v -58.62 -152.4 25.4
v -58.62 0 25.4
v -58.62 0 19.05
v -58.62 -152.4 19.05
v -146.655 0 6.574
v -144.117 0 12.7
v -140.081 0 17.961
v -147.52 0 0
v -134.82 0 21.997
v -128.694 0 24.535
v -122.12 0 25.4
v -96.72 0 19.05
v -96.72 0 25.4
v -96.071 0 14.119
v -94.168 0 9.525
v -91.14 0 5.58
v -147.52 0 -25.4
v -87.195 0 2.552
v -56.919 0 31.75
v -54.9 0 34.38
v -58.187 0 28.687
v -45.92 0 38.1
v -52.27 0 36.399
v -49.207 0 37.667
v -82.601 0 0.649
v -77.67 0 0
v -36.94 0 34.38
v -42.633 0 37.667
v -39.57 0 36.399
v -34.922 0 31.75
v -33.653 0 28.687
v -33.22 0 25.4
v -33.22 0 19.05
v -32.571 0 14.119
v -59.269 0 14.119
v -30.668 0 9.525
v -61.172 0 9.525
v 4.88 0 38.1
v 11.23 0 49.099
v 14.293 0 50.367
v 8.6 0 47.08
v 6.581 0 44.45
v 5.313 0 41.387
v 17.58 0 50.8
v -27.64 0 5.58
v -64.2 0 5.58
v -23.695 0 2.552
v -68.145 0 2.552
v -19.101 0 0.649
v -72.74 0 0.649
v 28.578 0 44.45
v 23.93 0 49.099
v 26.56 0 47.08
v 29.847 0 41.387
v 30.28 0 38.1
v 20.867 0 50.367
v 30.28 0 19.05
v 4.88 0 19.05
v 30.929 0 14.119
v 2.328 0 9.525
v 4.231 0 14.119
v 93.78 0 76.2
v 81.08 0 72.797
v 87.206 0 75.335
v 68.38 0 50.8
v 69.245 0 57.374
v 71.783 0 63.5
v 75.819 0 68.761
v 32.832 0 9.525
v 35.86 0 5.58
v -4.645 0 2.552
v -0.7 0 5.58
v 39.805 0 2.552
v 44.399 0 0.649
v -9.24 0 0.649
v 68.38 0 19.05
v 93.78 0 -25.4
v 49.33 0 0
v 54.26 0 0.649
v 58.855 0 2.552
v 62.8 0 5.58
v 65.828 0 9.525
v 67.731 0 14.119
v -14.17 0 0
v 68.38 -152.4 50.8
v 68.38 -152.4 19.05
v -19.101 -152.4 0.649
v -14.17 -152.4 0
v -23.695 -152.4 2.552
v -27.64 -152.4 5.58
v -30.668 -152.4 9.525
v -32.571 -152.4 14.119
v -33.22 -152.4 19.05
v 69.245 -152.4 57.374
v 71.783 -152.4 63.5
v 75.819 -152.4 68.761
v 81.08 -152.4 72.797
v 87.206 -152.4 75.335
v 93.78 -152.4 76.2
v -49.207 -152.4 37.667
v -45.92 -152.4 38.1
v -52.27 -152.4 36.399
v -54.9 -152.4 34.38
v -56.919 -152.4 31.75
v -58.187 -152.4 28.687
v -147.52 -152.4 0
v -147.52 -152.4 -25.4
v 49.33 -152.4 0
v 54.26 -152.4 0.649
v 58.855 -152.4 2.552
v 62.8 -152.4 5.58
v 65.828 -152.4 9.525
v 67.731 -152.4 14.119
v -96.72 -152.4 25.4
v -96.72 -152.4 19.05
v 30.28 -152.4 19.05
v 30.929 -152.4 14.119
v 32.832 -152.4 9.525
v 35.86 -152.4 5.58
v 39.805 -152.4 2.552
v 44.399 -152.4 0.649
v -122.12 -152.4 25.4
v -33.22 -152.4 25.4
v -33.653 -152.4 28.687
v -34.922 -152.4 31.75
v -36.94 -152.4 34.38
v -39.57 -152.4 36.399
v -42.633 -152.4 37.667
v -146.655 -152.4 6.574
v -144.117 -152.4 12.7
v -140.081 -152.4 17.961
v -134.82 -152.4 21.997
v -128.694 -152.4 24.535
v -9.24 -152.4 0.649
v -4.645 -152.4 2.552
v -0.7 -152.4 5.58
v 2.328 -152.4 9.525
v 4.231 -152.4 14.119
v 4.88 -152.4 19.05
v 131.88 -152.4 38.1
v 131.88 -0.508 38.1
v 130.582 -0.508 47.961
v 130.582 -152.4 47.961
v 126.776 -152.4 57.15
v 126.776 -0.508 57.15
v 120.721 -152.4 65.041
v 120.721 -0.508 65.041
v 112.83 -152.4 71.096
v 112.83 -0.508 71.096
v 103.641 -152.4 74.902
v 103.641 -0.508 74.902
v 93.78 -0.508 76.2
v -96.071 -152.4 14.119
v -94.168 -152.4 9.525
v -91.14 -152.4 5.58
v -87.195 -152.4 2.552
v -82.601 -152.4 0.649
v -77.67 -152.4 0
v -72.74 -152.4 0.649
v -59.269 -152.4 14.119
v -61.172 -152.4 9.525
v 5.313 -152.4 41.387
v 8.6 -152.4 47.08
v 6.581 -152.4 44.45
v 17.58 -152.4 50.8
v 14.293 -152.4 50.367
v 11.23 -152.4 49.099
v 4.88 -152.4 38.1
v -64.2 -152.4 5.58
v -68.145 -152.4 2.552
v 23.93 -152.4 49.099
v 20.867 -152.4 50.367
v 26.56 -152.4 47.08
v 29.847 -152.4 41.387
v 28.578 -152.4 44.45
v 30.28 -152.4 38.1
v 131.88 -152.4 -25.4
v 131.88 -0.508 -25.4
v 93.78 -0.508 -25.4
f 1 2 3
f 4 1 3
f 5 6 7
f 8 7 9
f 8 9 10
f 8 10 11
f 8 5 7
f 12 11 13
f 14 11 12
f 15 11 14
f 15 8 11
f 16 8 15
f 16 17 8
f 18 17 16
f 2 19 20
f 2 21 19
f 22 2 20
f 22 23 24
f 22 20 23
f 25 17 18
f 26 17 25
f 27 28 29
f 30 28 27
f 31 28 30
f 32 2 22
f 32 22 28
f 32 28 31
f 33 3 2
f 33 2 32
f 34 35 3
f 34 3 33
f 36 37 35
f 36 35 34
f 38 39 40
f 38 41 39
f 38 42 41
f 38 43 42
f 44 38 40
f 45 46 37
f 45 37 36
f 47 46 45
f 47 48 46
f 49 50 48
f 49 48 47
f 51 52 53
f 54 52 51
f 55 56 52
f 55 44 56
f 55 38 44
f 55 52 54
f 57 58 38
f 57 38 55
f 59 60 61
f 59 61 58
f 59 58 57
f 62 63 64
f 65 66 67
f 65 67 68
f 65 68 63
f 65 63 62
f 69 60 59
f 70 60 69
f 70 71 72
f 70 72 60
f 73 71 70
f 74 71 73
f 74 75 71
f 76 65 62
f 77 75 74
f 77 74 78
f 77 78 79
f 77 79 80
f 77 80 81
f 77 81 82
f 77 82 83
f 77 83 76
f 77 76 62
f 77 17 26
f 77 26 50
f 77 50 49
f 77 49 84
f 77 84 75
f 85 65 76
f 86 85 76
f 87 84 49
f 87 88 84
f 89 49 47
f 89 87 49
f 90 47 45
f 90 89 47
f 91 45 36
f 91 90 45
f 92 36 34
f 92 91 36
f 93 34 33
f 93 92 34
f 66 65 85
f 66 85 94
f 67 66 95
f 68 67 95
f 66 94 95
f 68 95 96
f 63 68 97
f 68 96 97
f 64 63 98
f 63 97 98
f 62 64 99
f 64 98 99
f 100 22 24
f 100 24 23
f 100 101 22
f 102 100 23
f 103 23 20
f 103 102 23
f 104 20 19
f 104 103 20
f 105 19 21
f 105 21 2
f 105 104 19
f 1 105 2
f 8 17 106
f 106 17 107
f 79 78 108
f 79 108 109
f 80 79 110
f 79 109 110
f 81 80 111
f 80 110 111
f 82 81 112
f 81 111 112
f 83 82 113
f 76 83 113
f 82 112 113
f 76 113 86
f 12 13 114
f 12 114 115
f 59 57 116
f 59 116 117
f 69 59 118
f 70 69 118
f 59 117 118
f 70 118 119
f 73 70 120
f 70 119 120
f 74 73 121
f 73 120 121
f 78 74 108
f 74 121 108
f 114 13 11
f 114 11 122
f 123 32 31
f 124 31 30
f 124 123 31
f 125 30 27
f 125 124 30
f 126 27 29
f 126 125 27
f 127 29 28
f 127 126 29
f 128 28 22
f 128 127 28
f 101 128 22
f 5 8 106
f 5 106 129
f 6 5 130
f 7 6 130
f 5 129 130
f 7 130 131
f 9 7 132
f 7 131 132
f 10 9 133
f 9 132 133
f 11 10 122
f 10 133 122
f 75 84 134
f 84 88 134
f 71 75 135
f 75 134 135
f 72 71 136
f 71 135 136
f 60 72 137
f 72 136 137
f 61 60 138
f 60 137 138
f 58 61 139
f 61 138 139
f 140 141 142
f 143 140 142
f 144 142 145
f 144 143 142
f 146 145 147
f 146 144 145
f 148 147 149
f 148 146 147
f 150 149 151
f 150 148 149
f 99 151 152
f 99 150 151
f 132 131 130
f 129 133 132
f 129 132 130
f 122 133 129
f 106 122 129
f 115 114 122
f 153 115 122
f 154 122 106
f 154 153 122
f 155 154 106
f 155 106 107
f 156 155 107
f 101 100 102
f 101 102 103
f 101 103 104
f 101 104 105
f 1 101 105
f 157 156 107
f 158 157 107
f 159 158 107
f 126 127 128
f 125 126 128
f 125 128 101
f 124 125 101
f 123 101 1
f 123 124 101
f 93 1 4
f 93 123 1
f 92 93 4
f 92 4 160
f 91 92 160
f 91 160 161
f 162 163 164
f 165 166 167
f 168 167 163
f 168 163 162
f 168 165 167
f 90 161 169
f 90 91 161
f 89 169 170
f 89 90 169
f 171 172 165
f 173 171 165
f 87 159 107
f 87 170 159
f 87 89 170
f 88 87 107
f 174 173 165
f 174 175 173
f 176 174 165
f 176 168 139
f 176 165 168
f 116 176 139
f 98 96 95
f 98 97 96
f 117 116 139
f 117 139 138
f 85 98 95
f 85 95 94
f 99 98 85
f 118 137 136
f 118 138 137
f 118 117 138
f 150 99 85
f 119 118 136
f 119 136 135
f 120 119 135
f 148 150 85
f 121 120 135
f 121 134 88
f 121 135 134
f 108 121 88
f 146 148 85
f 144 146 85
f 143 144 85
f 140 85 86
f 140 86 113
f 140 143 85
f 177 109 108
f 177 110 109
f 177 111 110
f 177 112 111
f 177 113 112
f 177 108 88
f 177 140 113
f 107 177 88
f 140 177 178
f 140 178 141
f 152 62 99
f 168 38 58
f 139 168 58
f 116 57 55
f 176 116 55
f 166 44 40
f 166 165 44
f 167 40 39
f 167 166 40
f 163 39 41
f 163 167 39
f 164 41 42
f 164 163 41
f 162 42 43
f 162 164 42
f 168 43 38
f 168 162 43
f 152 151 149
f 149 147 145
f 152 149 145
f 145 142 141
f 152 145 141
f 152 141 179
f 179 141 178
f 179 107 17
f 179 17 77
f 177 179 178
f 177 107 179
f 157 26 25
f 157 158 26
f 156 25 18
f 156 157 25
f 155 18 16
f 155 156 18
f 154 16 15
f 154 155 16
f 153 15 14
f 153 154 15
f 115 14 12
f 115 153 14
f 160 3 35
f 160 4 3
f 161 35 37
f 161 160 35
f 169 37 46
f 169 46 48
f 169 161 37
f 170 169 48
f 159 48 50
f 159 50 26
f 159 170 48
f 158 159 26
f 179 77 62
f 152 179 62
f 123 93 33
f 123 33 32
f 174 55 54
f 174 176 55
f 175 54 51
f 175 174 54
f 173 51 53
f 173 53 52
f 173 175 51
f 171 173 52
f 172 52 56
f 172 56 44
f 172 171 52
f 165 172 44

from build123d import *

# Parameters (mm, degrees)
F0_W      = 12.7
F0_H      = 25.4
F0_W_2    = 25.4
F1_DEPTH  = 152.4
F2_W      = 152.4
F2_H      = 25.4
F3_DEPTH  = 38.1
F4_R      = 25.4
F6_DEPTH  = 151.892
F7_R      = 19.05
F8_R      = 19.04999
F9_R      = 19.04999
F10_R     = 12.69999
F11_R     = 25.39999
F12_ANGLE = 90


# Not quite as in the source:
# - a fillet or chamfer is up to 0.001 mm smaller than in the source, because OpenCascade refuses the exact size


with BuildPart() as f1:
    # F0 (on Front) → F1 (new body)
    with BuildSketch(Plane.XZ):
        Polygon((-147.5200289965, 215.9), (-172.9200289965, 215.9), (-249.1200289965, 215.9), (-249.1200289965, 190.5), (-172.9200289965, 190.5), (-172.9200289965, 152.4), (-223.7200289965, 152.4), (-223.7200289965, 127), (-172.9200289965, 127), (-172.9200289965, 88.9), (-211.0200289965, 88.9), (-211.0200289965, 63.5), (-172.9200289965, 63.5), (-172.9200289965, 25.4), (-172.9200289965, 0), (-160.2200289965, 0), (-147.5200289965, 0), (-147.5200289965, 63.5), (-147.5200289965, 88.9), (-147.5200289965, 127), (-147.5200289965, 152.4), (-147.5200289965, 190.5), align=None)
        with Locations((-153.8700289965, -12.7)):
            Rectangle(F0_W, F0_H)
        with Locations((-185.6200289965, 12.7)):
            Rectangle(F0_W_2, F0_H)
    extrude(amount=F1_DEPTH)

    # F2 (on face) → F3 (join)
    with BuildSketch(Plane(origin=(-160.2200289965, 0, 0), x_dir=(0, -1, 0), z_dir=(-1, 0, 0))):
        with Locations((76.2, -12.7)):
            Rectangle(F2_W, F2_H)
    extrude(amount=F3_DEPTH)

    # F4
    f4_edges = [f1.edges().sort_by_distance(p)[0] for p in [
        (-198.320029, -76.2, -25.4),
    ]]
    fillet(f4_edges, radius=F4_R)

    # F5 (on face) → F6 (join)
    with BuildSketch(Plane.XZ.offset(152.4)):
        with BuildLine():
            ThreePointArc((-211.0200289965, 254), (-237.9607973597, 242.8407683632), (-249.1200289965, 215.9))
            Line((-249.1200289965, 215.9), (-147.5200289965, 215.9))
            Line((-147.5200289965, 215.9), (-147.5200289965, 254))
            Line((-147.5200289965, 254), (-211.0200289965, 254))
        make_face()
    extrude(amount=-F6_DEPTH)

    # F7
    f7_edges = [f1.edges().sort_by_distance(p)[0] for p in [
        (-172.920029, -76.2, 88.9),
    ]]
    fillet(f7_edges, radius=F7_R)

    # F8 (radius 19.05 in the source; OpenCascade refuses exactly that, so slightly less here)
    f8_edges = [f1.edges().sort_by_distance(p)[0] for p in [
        (-172.920029, -76.2, 190.5),
        (-172.920029, -76.2, 127),
    ]]
    fillet(f8_edges, radius=F8_R)

    # F9 (radius 19.05 in the source; OpenCascade refuses exactly that, so slightly less here)
    f9_edges = [f1.edges().sort_by_distance(p)[0] for p in [
        (-172.920029, -76.2, 152.4),
        (-172.920029, -76.2, 25.4),
        (-172.920029, -76.2, 63.5),
    ]]
    fillet(f9_edges, radius=F9_R)

    # F10 (radius 12.7 in the source; OpenCascade refuses exactly that, so slightly less here)
    f10_edges = [f1.edges().sort_by_distance(p)[0] for p in [
        (-223.720029, -76.2, 152.4),
        (-223.720029, -76.2, 127),
        (-211.020029, -76.2, 88.9),
        (-211.020029, -76.2, 63.5),
    ]]
    fillet(f10_edges, radius=F10_R)

    # F11 (radius 25.4 in the source; OpenCascade refuses exactly that, so slightly less here)
    f11_edges = [f1.edges().sort_by_distance(p)[0] for p in [
        (-249.120029, -76.2, 190.5),
    ]]
    fillet(f11_edges, radius=F11_R)


with BuildPart() as f1_1:
    # F12: moved
    add(f1.part.rotate(Axis((-147.5200289965, -76.2, -25.4), (0, 1, 0)), F12_ANGLE))


solid = f1_1.part
